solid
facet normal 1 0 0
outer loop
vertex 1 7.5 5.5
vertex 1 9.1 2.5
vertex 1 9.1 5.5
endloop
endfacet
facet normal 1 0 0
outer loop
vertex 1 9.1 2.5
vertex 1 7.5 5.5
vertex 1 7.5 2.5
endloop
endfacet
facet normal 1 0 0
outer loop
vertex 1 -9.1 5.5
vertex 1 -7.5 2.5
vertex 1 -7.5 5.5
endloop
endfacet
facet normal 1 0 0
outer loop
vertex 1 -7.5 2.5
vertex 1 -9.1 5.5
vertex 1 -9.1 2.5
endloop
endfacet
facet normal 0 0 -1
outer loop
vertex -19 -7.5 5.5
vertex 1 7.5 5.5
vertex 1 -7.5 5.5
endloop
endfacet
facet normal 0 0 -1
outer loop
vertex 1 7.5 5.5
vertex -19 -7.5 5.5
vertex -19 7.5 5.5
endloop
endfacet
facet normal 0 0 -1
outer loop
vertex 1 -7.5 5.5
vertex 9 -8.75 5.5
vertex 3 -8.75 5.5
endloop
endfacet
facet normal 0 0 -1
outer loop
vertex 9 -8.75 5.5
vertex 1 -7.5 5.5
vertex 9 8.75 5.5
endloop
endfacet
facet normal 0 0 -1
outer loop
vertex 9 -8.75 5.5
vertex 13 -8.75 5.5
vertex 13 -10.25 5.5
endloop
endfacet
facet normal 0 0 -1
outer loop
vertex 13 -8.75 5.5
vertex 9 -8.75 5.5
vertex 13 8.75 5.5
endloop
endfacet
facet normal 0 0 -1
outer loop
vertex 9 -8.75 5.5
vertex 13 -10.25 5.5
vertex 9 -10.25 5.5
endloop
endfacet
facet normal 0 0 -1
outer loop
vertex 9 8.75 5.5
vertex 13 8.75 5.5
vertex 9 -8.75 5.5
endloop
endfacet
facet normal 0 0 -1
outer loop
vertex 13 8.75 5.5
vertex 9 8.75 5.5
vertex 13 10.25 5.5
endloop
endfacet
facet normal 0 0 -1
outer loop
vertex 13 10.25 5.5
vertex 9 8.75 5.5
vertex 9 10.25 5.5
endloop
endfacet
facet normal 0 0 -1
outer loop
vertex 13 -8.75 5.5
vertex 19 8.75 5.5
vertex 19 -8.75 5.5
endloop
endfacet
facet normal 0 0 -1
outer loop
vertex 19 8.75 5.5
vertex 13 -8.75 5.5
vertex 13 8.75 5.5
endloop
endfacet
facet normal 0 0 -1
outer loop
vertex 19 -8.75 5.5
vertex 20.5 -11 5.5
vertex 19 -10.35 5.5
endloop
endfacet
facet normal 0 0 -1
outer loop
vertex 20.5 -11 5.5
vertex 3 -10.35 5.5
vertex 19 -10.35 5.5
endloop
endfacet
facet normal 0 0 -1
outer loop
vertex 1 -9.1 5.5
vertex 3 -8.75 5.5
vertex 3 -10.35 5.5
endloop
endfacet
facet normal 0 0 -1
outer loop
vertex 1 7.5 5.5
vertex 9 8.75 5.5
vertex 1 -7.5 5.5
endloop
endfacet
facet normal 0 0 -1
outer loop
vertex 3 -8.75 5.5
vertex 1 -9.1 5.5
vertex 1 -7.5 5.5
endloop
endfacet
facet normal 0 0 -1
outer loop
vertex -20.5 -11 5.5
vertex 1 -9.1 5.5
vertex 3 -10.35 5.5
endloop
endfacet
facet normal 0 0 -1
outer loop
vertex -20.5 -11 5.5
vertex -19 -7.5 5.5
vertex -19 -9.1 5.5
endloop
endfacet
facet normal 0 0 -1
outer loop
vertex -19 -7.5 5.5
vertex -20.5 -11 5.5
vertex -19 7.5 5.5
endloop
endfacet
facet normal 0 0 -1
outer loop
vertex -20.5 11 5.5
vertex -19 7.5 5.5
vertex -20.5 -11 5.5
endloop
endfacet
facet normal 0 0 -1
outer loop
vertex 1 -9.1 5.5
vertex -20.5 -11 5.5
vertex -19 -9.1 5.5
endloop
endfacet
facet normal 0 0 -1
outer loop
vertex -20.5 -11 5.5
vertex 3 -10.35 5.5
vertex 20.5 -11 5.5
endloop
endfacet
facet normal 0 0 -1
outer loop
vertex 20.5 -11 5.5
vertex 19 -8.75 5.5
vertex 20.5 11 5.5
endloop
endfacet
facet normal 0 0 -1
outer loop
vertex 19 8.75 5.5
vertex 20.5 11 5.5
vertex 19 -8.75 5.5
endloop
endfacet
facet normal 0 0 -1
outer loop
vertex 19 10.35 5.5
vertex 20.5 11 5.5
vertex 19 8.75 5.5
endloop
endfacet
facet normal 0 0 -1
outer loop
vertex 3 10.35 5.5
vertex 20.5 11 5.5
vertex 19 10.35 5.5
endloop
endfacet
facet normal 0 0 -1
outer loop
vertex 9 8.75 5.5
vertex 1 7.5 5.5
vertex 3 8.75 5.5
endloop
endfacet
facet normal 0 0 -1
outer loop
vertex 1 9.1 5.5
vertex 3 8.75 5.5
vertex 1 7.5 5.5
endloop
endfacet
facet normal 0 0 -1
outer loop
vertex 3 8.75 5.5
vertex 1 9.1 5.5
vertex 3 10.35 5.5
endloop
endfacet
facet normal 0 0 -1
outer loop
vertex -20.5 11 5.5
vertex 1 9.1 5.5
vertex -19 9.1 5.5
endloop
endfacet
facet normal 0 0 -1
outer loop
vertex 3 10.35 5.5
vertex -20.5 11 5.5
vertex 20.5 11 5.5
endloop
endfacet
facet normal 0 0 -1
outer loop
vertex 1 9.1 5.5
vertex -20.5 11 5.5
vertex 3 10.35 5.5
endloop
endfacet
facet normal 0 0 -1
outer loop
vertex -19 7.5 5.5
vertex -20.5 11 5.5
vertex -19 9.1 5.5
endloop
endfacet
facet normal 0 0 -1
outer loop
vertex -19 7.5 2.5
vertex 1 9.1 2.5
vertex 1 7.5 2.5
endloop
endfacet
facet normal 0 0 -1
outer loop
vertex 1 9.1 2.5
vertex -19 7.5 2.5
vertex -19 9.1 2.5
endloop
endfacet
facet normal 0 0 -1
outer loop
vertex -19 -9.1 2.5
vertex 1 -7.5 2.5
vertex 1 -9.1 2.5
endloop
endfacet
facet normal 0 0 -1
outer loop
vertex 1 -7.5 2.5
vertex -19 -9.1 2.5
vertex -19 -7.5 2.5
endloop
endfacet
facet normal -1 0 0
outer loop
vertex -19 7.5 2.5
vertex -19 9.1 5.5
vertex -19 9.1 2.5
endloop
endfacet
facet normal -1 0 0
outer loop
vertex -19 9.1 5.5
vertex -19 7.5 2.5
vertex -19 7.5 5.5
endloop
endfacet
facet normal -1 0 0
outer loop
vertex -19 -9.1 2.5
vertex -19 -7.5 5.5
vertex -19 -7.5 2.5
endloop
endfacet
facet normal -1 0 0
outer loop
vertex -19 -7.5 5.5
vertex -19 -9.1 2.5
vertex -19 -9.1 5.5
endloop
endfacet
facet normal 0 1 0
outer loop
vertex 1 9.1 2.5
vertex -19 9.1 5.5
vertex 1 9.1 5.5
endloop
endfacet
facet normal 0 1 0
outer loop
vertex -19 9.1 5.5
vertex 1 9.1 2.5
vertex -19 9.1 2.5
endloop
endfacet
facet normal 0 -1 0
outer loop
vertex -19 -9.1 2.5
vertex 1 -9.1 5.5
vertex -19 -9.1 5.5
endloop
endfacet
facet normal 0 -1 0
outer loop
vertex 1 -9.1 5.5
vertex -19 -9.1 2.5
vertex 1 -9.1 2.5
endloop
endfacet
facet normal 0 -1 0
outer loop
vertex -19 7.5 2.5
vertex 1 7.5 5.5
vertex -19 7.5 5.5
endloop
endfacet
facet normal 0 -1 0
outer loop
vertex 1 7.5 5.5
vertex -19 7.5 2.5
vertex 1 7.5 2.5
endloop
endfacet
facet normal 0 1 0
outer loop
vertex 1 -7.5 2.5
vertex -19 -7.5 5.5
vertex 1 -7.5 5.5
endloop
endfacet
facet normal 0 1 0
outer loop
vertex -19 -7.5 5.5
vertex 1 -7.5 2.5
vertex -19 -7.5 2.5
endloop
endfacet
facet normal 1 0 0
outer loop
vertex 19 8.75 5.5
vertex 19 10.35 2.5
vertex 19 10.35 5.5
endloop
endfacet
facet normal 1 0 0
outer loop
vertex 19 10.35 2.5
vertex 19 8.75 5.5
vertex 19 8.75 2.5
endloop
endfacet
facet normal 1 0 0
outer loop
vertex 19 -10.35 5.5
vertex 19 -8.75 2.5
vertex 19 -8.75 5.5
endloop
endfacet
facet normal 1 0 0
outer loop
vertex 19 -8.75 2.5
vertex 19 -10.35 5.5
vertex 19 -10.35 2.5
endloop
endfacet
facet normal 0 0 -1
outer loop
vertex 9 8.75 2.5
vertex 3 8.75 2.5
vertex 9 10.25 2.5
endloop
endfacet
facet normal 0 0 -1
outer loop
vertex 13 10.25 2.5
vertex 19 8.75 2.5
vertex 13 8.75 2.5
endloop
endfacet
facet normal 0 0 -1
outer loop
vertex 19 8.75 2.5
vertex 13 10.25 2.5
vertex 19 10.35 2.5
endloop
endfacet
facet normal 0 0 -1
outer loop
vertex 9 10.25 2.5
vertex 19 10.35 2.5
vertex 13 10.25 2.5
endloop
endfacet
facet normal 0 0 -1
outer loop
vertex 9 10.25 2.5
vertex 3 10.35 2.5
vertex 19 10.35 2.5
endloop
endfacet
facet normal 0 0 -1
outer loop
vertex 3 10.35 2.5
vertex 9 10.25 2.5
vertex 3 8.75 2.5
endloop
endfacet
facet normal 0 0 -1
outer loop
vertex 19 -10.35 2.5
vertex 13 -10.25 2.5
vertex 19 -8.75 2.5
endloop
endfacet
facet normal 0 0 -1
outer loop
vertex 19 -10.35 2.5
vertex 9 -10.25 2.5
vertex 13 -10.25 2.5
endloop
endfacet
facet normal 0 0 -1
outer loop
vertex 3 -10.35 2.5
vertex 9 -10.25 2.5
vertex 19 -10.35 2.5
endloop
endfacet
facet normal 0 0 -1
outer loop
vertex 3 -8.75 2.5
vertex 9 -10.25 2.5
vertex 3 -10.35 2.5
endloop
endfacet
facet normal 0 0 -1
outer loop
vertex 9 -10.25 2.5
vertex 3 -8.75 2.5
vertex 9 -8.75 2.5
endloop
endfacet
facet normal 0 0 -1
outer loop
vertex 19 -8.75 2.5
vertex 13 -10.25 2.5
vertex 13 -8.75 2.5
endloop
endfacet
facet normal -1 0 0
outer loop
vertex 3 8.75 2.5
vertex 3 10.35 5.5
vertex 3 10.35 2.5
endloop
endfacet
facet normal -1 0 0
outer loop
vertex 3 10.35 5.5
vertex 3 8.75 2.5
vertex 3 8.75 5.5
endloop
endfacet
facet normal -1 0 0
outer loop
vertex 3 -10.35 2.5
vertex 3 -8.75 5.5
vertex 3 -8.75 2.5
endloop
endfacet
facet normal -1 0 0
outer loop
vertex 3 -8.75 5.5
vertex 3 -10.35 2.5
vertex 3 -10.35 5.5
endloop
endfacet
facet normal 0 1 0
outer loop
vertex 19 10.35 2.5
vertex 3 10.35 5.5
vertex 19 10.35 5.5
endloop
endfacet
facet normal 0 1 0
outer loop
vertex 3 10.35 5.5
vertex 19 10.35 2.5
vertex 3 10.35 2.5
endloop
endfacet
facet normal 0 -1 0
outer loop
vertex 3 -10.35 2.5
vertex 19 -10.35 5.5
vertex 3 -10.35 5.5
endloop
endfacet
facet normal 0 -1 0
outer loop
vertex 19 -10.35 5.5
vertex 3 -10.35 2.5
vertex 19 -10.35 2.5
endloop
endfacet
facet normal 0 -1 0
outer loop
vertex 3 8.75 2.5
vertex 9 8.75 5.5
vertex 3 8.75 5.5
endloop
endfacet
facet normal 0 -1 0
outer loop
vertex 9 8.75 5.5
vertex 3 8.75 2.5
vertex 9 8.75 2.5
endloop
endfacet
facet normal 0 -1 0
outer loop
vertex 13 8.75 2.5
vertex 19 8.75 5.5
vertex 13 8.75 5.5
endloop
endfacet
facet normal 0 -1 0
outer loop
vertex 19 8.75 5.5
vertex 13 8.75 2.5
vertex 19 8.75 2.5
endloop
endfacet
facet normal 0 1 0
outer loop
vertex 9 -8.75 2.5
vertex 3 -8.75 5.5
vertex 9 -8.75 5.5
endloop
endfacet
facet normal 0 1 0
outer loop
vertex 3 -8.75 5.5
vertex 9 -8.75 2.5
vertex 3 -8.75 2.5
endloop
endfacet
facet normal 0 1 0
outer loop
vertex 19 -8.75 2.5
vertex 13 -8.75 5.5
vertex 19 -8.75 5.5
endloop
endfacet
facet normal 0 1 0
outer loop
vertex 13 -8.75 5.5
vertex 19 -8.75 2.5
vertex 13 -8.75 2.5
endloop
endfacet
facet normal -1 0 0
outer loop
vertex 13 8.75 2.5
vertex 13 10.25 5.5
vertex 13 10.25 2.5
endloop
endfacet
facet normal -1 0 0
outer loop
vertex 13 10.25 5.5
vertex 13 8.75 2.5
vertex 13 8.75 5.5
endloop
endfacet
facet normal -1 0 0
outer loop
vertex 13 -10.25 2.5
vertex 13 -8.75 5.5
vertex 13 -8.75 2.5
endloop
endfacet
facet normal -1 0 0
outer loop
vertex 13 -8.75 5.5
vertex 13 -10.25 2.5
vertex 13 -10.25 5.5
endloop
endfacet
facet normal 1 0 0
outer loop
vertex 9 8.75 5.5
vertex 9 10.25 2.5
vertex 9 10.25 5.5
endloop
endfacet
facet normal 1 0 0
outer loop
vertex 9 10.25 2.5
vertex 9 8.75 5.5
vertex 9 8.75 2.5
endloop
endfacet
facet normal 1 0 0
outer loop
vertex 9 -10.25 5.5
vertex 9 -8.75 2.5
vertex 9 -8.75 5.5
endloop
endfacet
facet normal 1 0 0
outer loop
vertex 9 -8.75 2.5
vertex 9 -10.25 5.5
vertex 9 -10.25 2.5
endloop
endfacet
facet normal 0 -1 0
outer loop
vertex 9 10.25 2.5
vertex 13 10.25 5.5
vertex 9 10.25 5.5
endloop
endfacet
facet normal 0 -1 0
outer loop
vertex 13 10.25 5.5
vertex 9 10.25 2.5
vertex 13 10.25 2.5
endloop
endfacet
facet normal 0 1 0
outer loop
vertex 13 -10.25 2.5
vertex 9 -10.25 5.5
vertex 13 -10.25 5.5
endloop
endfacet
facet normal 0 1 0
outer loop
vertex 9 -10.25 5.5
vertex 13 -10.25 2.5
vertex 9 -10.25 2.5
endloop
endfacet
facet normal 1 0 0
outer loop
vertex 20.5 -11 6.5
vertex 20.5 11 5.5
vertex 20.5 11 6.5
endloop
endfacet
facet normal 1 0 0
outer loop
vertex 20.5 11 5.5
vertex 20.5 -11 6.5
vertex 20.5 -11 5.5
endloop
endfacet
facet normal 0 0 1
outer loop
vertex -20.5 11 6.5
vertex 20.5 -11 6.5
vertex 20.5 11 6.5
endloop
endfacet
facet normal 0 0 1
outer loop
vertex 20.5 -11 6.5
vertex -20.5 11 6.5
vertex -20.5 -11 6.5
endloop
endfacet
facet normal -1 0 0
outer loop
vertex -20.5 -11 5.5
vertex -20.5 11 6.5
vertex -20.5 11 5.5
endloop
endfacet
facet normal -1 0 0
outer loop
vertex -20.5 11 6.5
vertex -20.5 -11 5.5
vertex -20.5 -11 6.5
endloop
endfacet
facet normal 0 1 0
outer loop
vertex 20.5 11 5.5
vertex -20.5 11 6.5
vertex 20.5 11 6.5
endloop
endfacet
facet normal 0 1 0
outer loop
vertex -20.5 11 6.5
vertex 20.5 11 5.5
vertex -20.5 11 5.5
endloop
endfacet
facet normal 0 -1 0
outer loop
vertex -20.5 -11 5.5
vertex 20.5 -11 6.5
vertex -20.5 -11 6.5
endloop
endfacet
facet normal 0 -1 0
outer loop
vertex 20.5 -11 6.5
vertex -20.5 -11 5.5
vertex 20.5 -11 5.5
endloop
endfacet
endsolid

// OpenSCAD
$fn = 50;

module tiny2040() {
  union() {
    // pcb
    color("darkgreen") difference() {
      cube([ 20.4, 18, 1 ], center = true);
      for (x = [-10.2:2.5:9])
        union() {
          for (y = [ 9, -9, 7.5, -7.5 ])
            translate([ x + 1.5, y, 0 ])
                cylinder(r = 0.5, 50, center = true, $fn = 20);
        }
    }
    // usb-c connector
    color("silver") translate([ -9, 0, 2 ]) rotate([ 90, 0, 90 ]) hull() {
      for (x = [ -3, 3 ])
        translate([ x, 0, 0 ]) cylinder(r = 1.5, 7.5, center = true, $fn = 30);
    }
    // buttons
    color("white") for (y = [ 3.5, -3.5 ]) translate([ 0, y, 1.5 ])
        cube([ 4, 3.5, 2.5 ], center = true);
    // chip
    color("black") translate([ 0, -0.5, -1 ]) cube([ 7, 7, 1 ], center = true);
  }
}

module adlx345() {
  union() {
    // pcb
    color("darkblue") difference() {
      cube([ 20.5, 16, 1 ], center = true);
      for (x = [-10.2:2.5:9])
        union() {
          translate([ x + 1.5, 6.5, 0 ])
              cylinder(r = 0.5, 50, center = true, $fn = 20);
        }
      for (x = [ -7.5, 7.5 ])
        union() {
          translate([ x, -5.5, 0 ])
              cylinder(r = 1.5, 50, center = true, $fn = 20);
        }
    }
    // chip
    color("black") translate([ 0, -0.5, 1 ]) cube([ 5, 3, 1 ], center = true);

    // capacitor
    color("orange") translate([ 0, -4.5, 1.2 ])
        cube([ 3, 2, 1.5 ], center = true);
  }
}

module circuit() {
  translate([ -9, 0, -1 ]) union() {
    tiny2040();
    translate([ 20, 0, 0 ]) rotate([ 0, 0, 90 ]) adlx345();
  }
}

module circuit_indent() {
  union() {
    // shallower indent for sliding in PCB
    translate([ 2, 0, 0 ]) cube([ 22.4, 18, 1 ], center = true);
    // deeper indent to leave room for solder and components
    cube([ 20.4, 16, 3 ], center = true);
    // bulge
    translate([ 0, 0, 0 ]) cube([ 22, 12, 1 ], center = true);
    // connection for cables
    translate([ 2, 0, 0 ]) cube([ 22, 16, 3 ], center = true);
    translate([ 20, 0, 0 ]) rotate([ 0, 0, 90 ]) {
      cube([ 20.5, 16, 1.5 ], center = true);
      cube([ 18.5, 16, 3 ], center = true);
    }
  }
}

module case_bottom() {
  difference() {
    // case
    color("yellow", 0.8) cube([ 41, 22, 7 ], center = true);
    union() {
      // rp2040
      translate([ -8, 0, 1 ]) union() {
        cube([ 23.4, 18, 5 ], center = true);
        cube([ 23.4, 16, 8 ], center = true);
        *cylinder(r = 8, 10, center = true);
        color("silver") translate([ -10, 0, 0 ]) rotate([ 90, 0, 90 ]) hull() {
          for (x = [ -3, 3 ])
            translate([ x, 0, 0 ]) {
              cylinder(r = 1.5, 7.5, center = true, $fn = 30);
              translate([ -1.5, 0, -3.5 ]) cube([ 3, 3.5, 3 ]);
            }
        }
      }
      translate([ 11, 0, 1 ]) union() {
        cube([ 17, 20.5, 5 ], center = true);
        cube([ 17, 18.5, 8 ], center = true);
        *cylinder(r = 8, 10, center = true);
      }
    }
  }
}

module case_top() {
  translate([ 0, 0, 6 ]) cube([ 41, 22, 1 ], center = true);
  color("red") {
    union() {
      translate([ -9, 0, 4 ]) difference() {
        cube([ 20, 18.2, 3 ], center = true);
        cube([ 20, 15, 3 ], center = true);
      }
      translate([ 11, 0, 4 ]) difference() {
        cube([ 16, 20.7, 3 ], center = true);
        cube([ 16, 17.5, 3 ], center = true);
        cube([ 4, 20.5, 3 ], center = true); // IC gap
      }
    }
  }
}


module eyelet() {
  difference() {
    hull() {
      translate([ -4, 2, 0 ]) cube([ 8, 2, 2 ]);
      cylinder(r = 4, 2);
    }
    cylinder(r = 2, 2);
  }
}

module eyelets() {
  for (x = [ -16.5, 0, 16.5 ]) {
    translate([ x, -14.5, -3.5 ]) eyelet();
    translate([ x, 14.5, -3.5 ]) rotate([ 0, 0, 180 ]) eyelet();
  }
}


case_top();
*eyelets();
*case_bottom();
*translate([ 0, 0, 1 ]) circuit();
